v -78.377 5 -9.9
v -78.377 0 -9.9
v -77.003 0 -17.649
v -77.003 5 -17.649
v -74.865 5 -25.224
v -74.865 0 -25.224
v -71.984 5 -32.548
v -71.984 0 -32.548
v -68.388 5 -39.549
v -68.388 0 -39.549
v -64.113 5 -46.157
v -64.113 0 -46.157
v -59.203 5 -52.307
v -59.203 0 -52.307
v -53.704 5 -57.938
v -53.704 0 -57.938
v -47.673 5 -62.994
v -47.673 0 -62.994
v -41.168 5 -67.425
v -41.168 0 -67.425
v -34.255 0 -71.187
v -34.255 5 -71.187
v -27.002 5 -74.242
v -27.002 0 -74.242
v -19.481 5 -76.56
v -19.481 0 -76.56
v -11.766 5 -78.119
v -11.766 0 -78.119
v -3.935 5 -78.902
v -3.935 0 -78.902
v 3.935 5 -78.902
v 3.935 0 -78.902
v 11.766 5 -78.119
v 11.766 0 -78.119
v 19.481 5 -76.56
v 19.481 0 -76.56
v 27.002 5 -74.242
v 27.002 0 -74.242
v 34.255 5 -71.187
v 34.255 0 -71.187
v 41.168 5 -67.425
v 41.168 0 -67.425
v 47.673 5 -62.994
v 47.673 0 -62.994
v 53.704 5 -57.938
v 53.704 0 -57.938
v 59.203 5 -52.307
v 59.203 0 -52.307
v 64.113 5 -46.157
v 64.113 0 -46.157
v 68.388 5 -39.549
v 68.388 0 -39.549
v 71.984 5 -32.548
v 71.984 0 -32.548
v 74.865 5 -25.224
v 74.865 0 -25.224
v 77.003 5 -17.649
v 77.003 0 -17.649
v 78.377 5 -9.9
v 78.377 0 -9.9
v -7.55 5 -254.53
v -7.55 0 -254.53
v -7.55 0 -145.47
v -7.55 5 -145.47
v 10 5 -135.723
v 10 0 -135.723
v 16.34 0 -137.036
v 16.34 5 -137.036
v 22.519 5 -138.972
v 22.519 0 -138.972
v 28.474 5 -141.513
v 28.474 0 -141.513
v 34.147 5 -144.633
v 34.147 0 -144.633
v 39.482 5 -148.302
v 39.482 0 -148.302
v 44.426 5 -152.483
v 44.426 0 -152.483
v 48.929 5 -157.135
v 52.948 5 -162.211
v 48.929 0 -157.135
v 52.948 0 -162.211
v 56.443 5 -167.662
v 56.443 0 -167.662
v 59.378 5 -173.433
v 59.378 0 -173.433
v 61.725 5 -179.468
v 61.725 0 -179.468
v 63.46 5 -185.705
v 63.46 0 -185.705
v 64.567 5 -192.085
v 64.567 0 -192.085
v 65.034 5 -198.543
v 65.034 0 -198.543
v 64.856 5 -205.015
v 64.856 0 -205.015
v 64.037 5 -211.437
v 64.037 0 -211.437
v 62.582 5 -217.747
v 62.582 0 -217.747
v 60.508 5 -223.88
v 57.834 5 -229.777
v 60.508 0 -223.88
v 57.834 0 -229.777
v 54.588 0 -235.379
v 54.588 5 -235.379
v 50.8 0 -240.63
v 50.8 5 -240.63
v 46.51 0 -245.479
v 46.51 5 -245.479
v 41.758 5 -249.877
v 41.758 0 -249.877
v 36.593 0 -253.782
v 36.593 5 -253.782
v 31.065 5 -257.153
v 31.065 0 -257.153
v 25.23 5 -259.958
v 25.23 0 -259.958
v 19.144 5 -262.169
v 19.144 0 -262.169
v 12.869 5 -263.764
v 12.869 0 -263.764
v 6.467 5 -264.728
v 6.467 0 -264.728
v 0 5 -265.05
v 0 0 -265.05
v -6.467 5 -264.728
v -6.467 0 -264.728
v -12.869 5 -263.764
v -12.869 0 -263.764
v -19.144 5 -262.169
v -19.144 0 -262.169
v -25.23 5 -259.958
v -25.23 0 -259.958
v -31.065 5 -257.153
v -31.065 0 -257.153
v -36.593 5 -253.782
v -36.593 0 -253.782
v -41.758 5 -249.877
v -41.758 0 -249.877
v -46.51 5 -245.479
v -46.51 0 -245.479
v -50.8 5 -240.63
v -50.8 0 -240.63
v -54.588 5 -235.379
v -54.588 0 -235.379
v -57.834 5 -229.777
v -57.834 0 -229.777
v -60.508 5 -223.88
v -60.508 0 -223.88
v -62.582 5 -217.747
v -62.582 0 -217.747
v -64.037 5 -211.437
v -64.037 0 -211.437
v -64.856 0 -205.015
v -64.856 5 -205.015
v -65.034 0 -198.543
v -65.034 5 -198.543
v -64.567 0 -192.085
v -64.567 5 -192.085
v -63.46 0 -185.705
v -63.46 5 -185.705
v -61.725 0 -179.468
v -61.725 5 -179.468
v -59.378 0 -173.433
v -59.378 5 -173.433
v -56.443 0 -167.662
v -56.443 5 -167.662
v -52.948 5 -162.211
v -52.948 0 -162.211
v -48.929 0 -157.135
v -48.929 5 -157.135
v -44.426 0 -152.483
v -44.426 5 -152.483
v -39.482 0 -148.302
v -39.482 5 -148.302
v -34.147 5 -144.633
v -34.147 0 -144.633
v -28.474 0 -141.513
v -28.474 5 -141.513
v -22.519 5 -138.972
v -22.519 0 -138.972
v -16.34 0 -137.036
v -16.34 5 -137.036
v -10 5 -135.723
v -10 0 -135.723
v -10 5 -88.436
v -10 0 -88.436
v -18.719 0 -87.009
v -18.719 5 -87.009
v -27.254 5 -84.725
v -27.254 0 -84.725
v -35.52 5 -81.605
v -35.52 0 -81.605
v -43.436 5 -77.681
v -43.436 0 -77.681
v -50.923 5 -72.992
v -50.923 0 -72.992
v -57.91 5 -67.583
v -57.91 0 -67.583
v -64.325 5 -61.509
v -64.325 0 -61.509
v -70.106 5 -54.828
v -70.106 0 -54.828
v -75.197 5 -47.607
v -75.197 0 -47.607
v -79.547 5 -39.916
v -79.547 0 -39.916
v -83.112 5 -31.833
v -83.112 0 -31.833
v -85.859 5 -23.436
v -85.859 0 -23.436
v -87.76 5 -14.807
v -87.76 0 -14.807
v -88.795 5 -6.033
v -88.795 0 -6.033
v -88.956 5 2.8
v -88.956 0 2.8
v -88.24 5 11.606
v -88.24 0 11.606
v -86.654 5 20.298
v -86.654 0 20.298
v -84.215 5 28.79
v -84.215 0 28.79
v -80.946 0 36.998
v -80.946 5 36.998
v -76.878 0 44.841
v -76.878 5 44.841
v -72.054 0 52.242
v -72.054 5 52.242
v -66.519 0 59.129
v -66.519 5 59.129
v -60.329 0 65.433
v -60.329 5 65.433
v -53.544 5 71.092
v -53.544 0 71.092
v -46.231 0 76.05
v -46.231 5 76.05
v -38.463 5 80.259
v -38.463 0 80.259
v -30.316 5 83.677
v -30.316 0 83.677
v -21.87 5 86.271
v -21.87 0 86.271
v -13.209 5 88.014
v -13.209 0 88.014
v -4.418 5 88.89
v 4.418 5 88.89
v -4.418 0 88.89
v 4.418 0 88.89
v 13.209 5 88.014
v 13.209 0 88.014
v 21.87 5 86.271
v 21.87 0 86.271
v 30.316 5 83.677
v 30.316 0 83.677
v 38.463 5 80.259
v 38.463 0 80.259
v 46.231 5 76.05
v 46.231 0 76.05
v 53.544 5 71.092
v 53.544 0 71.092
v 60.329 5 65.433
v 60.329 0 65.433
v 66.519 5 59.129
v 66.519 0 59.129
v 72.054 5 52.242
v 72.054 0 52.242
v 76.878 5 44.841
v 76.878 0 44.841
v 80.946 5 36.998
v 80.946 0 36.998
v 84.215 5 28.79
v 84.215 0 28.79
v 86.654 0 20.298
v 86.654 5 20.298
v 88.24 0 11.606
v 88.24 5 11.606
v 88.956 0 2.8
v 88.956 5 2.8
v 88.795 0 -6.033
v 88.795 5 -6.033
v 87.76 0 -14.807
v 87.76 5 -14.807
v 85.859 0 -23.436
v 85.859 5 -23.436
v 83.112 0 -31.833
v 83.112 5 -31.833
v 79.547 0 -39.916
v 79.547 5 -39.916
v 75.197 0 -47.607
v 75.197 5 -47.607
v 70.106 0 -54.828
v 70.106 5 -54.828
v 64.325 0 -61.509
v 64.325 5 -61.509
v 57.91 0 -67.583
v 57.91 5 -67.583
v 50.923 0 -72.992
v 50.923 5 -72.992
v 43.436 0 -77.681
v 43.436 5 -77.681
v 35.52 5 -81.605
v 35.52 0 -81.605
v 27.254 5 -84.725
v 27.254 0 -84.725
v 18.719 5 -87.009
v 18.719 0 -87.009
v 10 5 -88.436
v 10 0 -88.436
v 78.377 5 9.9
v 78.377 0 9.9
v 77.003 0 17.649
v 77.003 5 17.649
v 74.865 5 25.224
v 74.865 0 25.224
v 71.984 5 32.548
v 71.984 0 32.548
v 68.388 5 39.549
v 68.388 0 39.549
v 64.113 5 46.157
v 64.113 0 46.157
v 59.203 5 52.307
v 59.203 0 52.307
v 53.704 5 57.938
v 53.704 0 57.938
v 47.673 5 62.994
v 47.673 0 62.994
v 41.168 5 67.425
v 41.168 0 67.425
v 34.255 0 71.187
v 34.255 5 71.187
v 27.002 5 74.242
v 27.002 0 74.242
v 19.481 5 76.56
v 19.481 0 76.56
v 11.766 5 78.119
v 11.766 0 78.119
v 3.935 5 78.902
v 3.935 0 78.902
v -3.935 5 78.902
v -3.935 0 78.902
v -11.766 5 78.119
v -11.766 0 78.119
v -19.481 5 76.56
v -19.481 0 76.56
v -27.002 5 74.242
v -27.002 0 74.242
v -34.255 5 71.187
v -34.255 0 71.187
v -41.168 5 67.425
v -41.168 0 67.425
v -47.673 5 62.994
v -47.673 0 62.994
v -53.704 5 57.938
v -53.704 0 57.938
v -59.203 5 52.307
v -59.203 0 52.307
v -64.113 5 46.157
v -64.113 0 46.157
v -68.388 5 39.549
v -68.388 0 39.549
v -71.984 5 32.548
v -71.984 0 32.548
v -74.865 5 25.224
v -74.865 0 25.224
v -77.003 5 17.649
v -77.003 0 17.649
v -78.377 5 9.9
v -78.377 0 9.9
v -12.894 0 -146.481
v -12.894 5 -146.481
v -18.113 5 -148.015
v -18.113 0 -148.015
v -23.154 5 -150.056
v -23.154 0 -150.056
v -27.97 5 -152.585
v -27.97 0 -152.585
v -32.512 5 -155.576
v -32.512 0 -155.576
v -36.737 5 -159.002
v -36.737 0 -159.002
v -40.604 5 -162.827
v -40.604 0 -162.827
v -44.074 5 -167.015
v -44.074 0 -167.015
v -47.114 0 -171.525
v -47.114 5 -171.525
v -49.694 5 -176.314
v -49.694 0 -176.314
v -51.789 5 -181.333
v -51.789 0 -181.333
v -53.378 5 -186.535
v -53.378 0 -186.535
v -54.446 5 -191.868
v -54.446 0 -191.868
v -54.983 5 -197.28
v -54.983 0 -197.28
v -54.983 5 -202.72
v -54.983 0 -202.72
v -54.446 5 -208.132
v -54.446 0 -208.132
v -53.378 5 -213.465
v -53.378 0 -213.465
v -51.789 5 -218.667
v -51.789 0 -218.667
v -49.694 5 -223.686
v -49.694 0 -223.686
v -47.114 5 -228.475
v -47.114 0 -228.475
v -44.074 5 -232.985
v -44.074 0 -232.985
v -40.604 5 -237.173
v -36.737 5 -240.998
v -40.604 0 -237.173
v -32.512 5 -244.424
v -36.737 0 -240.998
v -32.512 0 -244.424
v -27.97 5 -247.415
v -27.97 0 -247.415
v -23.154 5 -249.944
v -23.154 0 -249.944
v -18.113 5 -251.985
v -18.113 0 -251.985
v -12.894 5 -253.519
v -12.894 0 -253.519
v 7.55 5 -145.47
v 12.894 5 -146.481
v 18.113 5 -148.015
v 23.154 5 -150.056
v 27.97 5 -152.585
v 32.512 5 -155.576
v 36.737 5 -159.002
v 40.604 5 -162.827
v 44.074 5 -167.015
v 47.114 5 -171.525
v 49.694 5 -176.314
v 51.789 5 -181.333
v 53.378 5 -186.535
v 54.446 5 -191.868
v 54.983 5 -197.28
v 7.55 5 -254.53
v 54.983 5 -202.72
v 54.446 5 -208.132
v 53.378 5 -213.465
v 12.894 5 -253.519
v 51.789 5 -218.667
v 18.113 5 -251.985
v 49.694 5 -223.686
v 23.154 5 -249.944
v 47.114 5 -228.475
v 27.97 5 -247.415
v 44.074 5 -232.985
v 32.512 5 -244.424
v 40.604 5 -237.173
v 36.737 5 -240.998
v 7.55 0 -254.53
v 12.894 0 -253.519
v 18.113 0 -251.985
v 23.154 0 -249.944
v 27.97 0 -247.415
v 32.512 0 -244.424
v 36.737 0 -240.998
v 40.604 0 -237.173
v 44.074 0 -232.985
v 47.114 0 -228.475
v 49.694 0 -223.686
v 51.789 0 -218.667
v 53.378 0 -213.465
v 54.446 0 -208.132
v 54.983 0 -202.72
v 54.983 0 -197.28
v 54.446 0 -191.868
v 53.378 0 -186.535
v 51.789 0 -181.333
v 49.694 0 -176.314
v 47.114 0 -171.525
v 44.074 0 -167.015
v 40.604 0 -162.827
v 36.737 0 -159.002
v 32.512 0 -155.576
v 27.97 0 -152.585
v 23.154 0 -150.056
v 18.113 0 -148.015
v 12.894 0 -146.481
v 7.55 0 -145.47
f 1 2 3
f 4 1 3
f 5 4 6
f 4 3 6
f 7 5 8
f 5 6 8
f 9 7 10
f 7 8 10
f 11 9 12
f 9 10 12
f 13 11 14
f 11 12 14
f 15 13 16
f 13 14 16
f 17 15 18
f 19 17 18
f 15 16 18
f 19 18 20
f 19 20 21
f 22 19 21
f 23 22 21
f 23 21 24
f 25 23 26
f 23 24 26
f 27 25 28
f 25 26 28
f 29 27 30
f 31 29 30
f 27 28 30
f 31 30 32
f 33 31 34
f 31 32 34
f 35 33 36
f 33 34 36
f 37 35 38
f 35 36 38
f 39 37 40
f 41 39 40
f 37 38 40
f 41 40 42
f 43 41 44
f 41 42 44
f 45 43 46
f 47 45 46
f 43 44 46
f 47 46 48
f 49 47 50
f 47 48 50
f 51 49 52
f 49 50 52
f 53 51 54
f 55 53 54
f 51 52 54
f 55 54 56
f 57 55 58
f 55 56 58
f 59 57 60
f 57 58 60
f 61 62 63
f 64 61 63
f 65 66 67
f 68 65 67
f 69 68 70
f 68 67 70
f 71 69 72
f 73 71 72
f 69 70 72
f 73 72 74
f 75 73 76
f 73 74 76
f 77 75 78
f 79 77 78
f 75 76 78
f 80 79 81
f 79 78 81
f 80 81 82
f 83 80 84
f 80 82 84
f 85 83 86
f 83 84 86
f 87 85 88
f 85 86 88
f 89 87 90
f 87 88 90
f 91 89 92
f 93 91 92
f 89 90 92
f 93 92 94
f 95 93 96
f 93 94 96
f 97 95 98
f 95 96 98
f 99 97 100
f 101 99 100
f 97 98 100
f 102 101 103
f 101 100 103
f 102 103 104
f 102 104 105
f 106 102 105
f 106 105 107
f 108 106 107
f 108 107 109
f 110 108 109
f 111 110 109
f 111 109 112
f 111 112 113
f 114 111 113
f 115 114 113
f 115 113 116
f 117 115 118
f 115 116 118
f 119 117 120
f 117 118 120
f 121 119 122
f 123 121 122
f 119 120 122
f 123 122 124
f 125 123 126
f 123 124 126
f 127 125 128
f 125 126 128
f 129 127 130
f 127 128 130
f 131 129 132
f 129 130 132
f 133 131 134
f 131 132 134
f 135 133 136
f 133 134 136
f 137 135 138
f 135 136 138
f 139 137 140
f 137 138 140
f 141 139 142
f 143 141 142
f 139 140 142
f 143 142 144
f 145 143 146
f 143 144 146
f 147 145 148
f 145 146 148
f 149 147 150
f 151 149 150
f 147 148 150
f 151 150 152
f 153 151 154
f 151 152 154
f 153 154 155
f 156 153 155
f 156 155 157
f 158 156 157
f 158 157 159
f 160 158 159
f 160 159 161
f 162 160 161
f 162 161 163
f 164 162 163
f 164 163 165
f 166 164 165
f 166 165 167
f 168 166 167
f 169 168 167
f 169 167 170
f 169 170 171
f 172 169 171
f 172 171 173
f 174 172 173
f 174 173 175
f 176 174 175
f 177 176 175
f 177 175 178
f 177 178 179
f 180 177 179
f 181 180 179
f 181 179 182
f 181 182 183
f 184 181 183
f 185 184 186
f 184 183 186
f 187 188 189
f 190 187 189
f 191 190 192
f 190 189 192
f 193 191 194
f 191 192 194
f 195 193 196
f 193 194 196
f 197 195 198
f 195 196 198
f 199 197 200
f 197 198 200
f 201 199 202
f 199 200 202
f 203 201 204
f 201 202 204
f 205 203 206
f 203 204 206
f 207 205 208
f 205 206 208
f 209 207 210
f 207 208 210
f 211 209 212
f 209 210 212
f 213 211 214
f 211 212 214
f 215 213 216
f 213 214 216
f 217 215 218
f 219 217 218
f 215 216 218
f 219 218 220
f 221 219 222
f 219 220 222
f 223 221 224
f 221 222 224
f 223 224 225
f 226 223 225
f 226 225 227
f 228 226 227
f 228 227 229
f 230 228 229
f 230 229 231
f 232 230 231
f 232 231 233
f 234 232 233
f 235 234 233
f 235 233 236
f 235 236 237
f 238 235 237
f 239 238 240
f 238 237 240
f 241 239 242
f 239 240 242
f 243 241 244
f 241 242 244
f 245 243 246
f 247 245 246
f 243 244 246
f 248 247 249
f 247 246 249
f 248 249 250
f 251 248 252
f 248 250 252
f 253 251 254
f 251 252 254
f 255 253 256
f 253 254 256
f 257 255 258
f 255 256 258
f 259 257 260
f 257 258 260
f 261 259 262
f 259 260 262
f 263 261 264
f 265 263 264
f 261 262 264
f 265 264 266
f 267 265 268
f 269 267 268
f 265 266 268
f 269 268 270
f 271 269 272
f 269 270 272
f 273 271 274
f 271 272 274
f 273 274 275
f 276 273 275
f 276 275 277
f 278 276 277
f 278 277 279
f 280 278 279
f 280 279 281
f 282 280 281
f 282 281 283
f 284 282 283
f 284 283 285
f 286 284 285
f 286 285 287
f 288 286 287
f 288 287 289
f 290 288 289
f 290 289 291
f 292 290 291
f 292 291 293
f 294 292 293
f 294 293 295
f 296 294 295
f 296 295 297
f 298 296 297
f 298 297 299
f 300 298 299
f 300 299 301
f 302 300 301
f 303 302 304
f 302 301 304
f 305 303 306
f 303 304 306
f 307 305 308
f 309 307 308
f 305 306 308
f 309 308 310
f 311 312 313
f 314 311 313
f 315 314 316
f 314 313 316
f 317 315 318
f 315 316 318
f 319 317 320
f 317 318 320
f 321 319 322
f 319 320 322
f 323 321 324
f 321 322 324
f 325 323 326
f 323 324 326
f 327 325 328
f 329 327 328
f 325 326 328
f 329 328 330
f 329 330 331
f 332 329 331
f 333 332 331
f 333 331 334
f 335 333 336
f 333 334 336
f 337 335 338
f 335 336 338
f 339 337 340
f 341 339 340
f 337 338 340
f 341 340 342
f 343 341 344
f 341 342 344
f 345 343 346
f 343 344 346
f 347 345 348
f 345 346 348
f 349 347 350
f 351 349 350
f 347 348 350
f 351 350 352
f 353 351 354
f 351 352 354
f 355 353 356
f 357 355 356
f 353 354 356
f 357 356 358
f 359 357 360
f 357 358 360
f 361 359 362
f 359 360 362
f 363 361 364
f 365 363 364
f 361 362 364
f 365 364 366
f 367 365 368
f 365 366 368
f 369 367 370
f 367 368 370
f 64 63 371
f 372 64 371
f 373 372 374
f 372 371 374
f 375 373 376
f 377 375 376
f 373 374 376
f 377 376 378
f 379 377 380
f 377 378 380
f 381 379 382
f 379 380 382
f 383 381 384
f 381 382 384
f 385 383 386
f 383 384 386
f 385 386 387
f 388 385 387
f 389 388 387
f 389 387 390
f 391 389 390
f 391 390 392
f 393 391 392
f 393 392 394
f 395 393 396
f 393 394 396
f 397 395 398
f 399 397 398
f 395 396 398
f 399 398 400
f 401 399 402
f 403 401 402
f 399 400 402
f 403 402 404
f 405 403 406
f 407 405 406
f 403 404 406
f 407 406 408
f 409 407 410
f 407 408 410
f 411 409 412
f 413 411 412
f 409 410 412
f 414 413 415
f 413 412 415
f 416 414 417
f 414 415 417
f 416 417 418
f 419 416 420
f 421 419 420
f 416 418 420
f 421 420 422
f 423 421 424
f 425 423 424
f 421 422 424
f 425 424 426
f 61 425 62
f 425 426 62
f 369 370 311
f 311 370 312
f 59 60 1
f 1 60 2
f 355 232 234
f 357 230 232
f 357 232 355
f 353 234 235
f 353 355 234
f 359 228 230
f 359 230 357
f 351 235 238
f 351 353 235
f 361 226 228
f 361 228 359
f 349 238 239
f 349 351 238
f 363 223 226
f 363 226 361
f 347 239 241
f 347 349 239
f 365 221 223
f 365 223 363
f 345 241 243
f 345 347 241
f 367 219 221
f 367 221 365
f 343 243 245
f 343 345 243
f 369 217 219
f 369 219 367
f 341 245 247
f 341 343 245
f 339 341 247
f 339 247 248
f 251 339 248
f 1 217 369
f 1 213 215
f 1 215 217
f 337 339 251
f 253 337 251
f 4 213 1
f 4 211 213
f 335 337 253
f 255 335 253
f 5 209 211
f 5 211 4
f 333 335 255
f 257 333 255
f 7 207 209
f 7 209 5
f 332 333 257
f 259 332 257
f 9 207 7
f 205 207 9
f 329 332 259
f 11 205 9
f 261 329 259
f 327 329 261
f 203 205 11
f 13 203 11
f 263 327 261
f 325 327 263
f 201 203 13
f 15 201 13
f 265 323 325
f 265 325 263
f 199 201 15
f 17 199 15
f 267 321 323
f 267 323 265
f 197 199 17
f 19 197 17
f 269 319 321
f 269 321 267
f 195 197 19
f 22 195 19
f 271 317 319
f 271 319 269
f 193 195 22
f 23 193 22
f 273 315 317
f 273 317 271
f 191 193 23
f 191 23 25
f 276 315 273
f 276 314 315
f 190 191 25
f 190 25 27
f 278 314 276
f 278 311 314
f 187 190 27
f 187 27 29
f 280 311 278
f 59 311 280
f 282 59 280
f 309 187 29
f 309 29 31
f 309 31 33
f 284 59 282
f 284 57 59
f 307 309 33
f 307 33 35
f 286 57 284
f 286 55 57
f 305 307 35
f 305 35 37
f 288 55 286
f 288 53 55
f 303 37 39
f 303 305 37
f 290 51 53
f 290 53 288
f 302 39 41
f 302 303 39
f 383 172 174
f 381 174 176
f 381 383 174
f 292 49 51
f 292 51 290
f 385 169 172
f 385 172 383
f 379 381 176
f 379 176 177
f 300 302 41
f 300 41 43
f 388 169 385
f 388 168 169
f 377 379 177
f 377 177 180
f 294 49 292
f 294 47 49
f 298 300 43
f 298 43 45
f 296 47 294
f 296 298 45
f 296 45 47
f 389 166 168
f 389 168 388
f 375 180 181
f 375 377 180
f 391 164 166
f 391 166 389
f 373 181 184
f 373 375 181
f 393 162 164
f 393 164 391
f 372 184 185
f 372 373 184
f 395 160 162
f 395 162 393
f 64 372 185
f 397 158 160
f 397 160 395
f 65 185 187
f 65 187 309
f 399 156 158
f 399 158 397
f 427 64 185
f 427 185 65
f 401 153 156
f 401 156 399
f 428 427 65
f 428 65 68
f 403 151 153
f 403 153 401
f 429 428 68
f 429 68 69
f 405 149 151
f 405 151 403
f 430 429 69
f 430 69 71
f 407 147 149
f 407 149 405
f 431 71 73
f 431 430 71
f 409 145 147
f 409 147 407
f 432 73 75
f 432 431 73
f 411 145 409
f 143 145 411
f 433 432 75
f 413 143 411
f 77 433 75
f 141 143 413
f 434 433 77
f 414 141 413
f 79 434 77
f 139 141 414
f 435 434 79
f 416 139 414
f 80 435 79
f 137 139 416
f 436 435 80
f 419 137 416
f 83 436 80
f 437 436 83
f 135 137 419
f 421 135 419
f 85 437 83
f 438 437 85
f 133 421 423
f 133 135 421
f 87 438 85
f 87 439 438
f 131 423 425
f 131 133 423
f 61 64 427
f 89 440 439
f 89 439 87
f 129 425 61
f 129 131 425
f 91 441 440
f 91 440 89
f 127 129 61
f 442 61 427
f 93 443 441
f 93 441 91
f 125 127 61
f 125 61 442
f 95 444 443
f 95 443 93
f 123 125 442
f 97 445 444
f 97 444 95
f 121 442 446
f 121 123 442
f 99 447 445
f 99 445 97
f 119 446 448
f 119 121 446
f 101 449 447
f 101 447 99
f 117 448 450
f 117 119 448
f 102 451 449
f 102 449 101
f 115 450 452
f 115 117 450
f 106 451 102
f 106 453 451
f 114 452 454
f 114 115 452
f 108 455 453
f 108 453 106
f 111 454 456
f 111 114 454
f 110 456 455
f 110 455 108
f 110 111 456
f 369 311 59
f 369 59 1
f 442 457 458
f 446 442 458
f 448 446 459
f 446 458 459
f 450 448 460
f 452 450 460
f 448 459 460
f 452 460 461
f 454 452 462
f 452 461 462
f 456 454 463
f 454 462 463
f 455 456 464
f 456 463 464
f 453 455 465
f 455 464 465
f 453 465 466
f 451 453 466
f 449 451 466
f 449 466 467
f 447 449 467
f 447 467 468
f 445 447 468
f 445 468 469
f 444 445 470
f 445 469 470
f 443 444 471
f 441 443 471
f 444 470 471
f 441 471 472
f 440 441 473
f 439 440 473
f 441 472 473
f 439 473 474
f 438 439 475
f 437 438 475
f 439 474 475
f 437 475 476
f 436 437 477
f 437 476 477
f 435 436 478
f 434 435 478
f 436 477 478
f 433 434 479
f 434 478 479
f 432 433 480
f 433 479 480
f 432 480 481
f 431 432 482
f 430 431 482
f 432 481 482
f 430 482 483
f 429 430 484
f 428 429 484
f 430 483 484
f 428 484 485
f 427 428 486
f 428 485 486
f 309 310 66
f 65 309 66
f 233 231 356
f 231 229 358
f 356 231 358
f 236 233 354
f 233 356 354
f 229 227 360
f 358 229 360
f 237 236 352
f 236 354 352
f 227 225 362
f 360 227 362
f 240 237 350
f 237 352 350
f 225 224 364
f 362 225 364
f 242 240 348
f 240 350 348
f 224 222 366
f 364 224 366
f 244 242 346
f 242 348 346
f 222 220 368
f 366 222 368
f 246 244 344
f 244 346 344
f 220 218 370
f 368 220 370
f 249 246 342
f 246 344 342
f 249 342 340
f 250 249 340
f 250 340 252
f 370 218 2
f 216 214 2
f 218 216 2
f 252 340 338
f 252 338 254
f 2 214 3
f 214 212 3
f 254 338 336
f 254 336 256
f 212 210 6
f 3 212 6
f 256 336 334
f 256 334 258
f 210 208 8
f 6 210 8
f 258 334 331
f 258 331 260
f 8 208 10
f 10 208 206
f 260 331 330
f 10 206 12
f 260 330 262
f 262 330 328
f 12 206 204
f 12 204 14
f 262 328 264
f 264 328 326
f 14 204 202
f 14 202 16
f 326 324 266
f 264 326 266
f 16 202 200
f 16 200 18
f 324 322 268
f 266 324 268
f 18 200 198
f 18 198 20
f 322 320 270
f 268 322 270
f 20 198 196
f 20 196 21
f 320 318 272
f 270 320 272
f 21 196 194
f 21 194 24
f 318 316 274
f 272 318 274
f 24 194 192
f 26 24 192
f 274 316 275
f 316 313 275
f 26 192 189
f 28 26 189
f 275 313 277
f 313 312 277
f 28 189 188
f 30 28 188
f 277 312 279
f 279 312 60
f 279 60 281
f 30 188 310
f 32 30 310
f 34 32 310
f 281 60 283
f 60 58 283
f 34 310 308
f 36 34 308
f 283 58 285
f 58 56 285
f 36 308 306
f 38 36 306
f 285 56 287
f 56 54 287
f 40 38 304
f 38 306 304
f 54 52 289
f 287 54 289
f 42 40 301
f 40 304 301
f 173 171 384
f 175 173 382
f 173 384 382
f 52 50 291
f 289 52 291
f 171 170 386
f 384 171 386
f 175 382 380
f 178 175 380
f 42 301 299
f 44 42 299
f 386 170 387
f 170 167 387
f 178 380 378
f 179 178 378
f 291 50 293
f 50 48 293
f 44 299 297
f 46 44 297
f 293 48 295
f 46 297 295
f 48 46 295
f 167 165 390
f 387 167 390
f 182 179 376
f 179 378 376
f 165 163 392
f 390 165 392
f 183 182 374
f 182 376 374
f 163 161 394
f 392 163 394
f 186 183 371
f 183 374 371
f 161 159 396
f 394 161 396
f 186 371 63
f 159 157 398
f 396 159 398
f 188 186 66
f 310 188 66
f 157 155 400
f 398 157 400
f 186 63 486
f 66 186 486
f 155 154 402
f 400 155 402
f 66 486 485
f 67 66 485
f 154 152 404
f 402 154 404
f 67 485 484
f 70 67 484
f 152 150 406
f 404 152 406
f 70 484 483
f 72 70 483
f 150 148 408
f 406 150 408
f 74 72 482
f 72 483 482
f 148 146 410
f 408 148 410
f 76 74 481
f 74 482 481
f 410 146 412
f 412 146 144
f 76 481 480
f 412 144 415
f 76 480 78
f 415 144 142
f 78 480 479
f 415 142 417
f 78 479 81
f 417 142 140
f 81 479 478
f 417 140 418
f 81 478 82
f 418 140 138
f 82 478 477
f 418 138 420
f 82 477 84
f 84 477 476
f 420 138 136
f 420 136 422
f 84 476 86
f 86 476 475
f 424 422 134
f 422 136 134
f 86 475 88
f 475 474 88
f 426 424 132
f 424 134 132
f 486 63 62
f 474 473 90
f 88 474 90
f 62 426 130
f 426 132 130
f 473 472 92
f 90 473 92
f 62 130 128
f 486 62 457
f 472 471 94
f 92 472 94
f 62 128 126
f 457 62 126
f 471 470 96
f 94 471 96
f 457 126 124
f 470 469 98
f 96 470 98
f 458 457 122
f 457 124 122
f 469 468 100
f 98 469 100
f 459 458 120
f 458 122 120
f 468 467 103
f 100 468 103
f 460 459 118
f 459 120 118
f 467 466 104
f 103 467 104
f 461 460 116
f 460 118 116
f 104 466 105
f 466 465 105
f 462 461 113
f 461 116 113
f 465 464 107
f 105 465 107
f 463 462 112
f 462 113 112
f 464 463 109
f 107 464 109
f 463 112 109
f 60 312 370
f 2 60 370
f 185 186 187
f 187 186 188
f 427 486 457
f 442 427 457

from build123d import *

# Parameters (mm, degrees)
BOSS_EXTRUDE1_DEPTH = 5


with BuildPart() as part:
    # Sketch1 → Boss-Extrude1 (new body)
    with BuildSketch(Plane(origin=(0, 0, 0), x_dir=(1, 0, 0), z_dir=(0, 1, 0))):
        with BuildLine():
            ThreePointArc((-10, 88.436417838), (0, -89), (10, 88.436417838))
            Line((10, 88.436417838), (10, 135.723235147))
            ThreePointArc((10, 135.723235147), (0, 265.05), (-10, 135.723235147))
            Line((-10, 135.723235147), (-10, 88.436417838))
        make_face()
        with BuildLine():
            ThreePointArc((-7.55, 145.470191638), (-55.05, 200), (-7.55, 254.529808362))
            Line((-7.55, 254.529808362), (-7.55, 145.470191638))
        make_face(mode=Mode.SUBTRACT)
        with BuildLine():
            Line((7.55, 145.470191638), (7.55, 254.529808362))
            ThreePointArc((7.55, 254.529808362), (55.05, 200), (7.55, 145.470191638))
        make_face(mode=Mode.SUBTRACT)
        with BuildLine():
            Line((-78.377228836, -9.9), (78.377228836, -9.9))
            ThreePointArc((78.377228836, -9.9), (0, -79), (-78.377228836, -9.9))
        make_face(mode=Mode.SUBTRACT)
        with BuildLine():
            Line((78.377228836, 9.9), (-78.377228836, 9.9))
            ThreePointArc((-78.377228836, 9.9), (0, 79), (78.377228836, 9.9))
        make_face(mode=Mode.SUBTRACT)
    extrude(amount=BOSS_EXTRUDE1_DEPTH)


solid = part.part
